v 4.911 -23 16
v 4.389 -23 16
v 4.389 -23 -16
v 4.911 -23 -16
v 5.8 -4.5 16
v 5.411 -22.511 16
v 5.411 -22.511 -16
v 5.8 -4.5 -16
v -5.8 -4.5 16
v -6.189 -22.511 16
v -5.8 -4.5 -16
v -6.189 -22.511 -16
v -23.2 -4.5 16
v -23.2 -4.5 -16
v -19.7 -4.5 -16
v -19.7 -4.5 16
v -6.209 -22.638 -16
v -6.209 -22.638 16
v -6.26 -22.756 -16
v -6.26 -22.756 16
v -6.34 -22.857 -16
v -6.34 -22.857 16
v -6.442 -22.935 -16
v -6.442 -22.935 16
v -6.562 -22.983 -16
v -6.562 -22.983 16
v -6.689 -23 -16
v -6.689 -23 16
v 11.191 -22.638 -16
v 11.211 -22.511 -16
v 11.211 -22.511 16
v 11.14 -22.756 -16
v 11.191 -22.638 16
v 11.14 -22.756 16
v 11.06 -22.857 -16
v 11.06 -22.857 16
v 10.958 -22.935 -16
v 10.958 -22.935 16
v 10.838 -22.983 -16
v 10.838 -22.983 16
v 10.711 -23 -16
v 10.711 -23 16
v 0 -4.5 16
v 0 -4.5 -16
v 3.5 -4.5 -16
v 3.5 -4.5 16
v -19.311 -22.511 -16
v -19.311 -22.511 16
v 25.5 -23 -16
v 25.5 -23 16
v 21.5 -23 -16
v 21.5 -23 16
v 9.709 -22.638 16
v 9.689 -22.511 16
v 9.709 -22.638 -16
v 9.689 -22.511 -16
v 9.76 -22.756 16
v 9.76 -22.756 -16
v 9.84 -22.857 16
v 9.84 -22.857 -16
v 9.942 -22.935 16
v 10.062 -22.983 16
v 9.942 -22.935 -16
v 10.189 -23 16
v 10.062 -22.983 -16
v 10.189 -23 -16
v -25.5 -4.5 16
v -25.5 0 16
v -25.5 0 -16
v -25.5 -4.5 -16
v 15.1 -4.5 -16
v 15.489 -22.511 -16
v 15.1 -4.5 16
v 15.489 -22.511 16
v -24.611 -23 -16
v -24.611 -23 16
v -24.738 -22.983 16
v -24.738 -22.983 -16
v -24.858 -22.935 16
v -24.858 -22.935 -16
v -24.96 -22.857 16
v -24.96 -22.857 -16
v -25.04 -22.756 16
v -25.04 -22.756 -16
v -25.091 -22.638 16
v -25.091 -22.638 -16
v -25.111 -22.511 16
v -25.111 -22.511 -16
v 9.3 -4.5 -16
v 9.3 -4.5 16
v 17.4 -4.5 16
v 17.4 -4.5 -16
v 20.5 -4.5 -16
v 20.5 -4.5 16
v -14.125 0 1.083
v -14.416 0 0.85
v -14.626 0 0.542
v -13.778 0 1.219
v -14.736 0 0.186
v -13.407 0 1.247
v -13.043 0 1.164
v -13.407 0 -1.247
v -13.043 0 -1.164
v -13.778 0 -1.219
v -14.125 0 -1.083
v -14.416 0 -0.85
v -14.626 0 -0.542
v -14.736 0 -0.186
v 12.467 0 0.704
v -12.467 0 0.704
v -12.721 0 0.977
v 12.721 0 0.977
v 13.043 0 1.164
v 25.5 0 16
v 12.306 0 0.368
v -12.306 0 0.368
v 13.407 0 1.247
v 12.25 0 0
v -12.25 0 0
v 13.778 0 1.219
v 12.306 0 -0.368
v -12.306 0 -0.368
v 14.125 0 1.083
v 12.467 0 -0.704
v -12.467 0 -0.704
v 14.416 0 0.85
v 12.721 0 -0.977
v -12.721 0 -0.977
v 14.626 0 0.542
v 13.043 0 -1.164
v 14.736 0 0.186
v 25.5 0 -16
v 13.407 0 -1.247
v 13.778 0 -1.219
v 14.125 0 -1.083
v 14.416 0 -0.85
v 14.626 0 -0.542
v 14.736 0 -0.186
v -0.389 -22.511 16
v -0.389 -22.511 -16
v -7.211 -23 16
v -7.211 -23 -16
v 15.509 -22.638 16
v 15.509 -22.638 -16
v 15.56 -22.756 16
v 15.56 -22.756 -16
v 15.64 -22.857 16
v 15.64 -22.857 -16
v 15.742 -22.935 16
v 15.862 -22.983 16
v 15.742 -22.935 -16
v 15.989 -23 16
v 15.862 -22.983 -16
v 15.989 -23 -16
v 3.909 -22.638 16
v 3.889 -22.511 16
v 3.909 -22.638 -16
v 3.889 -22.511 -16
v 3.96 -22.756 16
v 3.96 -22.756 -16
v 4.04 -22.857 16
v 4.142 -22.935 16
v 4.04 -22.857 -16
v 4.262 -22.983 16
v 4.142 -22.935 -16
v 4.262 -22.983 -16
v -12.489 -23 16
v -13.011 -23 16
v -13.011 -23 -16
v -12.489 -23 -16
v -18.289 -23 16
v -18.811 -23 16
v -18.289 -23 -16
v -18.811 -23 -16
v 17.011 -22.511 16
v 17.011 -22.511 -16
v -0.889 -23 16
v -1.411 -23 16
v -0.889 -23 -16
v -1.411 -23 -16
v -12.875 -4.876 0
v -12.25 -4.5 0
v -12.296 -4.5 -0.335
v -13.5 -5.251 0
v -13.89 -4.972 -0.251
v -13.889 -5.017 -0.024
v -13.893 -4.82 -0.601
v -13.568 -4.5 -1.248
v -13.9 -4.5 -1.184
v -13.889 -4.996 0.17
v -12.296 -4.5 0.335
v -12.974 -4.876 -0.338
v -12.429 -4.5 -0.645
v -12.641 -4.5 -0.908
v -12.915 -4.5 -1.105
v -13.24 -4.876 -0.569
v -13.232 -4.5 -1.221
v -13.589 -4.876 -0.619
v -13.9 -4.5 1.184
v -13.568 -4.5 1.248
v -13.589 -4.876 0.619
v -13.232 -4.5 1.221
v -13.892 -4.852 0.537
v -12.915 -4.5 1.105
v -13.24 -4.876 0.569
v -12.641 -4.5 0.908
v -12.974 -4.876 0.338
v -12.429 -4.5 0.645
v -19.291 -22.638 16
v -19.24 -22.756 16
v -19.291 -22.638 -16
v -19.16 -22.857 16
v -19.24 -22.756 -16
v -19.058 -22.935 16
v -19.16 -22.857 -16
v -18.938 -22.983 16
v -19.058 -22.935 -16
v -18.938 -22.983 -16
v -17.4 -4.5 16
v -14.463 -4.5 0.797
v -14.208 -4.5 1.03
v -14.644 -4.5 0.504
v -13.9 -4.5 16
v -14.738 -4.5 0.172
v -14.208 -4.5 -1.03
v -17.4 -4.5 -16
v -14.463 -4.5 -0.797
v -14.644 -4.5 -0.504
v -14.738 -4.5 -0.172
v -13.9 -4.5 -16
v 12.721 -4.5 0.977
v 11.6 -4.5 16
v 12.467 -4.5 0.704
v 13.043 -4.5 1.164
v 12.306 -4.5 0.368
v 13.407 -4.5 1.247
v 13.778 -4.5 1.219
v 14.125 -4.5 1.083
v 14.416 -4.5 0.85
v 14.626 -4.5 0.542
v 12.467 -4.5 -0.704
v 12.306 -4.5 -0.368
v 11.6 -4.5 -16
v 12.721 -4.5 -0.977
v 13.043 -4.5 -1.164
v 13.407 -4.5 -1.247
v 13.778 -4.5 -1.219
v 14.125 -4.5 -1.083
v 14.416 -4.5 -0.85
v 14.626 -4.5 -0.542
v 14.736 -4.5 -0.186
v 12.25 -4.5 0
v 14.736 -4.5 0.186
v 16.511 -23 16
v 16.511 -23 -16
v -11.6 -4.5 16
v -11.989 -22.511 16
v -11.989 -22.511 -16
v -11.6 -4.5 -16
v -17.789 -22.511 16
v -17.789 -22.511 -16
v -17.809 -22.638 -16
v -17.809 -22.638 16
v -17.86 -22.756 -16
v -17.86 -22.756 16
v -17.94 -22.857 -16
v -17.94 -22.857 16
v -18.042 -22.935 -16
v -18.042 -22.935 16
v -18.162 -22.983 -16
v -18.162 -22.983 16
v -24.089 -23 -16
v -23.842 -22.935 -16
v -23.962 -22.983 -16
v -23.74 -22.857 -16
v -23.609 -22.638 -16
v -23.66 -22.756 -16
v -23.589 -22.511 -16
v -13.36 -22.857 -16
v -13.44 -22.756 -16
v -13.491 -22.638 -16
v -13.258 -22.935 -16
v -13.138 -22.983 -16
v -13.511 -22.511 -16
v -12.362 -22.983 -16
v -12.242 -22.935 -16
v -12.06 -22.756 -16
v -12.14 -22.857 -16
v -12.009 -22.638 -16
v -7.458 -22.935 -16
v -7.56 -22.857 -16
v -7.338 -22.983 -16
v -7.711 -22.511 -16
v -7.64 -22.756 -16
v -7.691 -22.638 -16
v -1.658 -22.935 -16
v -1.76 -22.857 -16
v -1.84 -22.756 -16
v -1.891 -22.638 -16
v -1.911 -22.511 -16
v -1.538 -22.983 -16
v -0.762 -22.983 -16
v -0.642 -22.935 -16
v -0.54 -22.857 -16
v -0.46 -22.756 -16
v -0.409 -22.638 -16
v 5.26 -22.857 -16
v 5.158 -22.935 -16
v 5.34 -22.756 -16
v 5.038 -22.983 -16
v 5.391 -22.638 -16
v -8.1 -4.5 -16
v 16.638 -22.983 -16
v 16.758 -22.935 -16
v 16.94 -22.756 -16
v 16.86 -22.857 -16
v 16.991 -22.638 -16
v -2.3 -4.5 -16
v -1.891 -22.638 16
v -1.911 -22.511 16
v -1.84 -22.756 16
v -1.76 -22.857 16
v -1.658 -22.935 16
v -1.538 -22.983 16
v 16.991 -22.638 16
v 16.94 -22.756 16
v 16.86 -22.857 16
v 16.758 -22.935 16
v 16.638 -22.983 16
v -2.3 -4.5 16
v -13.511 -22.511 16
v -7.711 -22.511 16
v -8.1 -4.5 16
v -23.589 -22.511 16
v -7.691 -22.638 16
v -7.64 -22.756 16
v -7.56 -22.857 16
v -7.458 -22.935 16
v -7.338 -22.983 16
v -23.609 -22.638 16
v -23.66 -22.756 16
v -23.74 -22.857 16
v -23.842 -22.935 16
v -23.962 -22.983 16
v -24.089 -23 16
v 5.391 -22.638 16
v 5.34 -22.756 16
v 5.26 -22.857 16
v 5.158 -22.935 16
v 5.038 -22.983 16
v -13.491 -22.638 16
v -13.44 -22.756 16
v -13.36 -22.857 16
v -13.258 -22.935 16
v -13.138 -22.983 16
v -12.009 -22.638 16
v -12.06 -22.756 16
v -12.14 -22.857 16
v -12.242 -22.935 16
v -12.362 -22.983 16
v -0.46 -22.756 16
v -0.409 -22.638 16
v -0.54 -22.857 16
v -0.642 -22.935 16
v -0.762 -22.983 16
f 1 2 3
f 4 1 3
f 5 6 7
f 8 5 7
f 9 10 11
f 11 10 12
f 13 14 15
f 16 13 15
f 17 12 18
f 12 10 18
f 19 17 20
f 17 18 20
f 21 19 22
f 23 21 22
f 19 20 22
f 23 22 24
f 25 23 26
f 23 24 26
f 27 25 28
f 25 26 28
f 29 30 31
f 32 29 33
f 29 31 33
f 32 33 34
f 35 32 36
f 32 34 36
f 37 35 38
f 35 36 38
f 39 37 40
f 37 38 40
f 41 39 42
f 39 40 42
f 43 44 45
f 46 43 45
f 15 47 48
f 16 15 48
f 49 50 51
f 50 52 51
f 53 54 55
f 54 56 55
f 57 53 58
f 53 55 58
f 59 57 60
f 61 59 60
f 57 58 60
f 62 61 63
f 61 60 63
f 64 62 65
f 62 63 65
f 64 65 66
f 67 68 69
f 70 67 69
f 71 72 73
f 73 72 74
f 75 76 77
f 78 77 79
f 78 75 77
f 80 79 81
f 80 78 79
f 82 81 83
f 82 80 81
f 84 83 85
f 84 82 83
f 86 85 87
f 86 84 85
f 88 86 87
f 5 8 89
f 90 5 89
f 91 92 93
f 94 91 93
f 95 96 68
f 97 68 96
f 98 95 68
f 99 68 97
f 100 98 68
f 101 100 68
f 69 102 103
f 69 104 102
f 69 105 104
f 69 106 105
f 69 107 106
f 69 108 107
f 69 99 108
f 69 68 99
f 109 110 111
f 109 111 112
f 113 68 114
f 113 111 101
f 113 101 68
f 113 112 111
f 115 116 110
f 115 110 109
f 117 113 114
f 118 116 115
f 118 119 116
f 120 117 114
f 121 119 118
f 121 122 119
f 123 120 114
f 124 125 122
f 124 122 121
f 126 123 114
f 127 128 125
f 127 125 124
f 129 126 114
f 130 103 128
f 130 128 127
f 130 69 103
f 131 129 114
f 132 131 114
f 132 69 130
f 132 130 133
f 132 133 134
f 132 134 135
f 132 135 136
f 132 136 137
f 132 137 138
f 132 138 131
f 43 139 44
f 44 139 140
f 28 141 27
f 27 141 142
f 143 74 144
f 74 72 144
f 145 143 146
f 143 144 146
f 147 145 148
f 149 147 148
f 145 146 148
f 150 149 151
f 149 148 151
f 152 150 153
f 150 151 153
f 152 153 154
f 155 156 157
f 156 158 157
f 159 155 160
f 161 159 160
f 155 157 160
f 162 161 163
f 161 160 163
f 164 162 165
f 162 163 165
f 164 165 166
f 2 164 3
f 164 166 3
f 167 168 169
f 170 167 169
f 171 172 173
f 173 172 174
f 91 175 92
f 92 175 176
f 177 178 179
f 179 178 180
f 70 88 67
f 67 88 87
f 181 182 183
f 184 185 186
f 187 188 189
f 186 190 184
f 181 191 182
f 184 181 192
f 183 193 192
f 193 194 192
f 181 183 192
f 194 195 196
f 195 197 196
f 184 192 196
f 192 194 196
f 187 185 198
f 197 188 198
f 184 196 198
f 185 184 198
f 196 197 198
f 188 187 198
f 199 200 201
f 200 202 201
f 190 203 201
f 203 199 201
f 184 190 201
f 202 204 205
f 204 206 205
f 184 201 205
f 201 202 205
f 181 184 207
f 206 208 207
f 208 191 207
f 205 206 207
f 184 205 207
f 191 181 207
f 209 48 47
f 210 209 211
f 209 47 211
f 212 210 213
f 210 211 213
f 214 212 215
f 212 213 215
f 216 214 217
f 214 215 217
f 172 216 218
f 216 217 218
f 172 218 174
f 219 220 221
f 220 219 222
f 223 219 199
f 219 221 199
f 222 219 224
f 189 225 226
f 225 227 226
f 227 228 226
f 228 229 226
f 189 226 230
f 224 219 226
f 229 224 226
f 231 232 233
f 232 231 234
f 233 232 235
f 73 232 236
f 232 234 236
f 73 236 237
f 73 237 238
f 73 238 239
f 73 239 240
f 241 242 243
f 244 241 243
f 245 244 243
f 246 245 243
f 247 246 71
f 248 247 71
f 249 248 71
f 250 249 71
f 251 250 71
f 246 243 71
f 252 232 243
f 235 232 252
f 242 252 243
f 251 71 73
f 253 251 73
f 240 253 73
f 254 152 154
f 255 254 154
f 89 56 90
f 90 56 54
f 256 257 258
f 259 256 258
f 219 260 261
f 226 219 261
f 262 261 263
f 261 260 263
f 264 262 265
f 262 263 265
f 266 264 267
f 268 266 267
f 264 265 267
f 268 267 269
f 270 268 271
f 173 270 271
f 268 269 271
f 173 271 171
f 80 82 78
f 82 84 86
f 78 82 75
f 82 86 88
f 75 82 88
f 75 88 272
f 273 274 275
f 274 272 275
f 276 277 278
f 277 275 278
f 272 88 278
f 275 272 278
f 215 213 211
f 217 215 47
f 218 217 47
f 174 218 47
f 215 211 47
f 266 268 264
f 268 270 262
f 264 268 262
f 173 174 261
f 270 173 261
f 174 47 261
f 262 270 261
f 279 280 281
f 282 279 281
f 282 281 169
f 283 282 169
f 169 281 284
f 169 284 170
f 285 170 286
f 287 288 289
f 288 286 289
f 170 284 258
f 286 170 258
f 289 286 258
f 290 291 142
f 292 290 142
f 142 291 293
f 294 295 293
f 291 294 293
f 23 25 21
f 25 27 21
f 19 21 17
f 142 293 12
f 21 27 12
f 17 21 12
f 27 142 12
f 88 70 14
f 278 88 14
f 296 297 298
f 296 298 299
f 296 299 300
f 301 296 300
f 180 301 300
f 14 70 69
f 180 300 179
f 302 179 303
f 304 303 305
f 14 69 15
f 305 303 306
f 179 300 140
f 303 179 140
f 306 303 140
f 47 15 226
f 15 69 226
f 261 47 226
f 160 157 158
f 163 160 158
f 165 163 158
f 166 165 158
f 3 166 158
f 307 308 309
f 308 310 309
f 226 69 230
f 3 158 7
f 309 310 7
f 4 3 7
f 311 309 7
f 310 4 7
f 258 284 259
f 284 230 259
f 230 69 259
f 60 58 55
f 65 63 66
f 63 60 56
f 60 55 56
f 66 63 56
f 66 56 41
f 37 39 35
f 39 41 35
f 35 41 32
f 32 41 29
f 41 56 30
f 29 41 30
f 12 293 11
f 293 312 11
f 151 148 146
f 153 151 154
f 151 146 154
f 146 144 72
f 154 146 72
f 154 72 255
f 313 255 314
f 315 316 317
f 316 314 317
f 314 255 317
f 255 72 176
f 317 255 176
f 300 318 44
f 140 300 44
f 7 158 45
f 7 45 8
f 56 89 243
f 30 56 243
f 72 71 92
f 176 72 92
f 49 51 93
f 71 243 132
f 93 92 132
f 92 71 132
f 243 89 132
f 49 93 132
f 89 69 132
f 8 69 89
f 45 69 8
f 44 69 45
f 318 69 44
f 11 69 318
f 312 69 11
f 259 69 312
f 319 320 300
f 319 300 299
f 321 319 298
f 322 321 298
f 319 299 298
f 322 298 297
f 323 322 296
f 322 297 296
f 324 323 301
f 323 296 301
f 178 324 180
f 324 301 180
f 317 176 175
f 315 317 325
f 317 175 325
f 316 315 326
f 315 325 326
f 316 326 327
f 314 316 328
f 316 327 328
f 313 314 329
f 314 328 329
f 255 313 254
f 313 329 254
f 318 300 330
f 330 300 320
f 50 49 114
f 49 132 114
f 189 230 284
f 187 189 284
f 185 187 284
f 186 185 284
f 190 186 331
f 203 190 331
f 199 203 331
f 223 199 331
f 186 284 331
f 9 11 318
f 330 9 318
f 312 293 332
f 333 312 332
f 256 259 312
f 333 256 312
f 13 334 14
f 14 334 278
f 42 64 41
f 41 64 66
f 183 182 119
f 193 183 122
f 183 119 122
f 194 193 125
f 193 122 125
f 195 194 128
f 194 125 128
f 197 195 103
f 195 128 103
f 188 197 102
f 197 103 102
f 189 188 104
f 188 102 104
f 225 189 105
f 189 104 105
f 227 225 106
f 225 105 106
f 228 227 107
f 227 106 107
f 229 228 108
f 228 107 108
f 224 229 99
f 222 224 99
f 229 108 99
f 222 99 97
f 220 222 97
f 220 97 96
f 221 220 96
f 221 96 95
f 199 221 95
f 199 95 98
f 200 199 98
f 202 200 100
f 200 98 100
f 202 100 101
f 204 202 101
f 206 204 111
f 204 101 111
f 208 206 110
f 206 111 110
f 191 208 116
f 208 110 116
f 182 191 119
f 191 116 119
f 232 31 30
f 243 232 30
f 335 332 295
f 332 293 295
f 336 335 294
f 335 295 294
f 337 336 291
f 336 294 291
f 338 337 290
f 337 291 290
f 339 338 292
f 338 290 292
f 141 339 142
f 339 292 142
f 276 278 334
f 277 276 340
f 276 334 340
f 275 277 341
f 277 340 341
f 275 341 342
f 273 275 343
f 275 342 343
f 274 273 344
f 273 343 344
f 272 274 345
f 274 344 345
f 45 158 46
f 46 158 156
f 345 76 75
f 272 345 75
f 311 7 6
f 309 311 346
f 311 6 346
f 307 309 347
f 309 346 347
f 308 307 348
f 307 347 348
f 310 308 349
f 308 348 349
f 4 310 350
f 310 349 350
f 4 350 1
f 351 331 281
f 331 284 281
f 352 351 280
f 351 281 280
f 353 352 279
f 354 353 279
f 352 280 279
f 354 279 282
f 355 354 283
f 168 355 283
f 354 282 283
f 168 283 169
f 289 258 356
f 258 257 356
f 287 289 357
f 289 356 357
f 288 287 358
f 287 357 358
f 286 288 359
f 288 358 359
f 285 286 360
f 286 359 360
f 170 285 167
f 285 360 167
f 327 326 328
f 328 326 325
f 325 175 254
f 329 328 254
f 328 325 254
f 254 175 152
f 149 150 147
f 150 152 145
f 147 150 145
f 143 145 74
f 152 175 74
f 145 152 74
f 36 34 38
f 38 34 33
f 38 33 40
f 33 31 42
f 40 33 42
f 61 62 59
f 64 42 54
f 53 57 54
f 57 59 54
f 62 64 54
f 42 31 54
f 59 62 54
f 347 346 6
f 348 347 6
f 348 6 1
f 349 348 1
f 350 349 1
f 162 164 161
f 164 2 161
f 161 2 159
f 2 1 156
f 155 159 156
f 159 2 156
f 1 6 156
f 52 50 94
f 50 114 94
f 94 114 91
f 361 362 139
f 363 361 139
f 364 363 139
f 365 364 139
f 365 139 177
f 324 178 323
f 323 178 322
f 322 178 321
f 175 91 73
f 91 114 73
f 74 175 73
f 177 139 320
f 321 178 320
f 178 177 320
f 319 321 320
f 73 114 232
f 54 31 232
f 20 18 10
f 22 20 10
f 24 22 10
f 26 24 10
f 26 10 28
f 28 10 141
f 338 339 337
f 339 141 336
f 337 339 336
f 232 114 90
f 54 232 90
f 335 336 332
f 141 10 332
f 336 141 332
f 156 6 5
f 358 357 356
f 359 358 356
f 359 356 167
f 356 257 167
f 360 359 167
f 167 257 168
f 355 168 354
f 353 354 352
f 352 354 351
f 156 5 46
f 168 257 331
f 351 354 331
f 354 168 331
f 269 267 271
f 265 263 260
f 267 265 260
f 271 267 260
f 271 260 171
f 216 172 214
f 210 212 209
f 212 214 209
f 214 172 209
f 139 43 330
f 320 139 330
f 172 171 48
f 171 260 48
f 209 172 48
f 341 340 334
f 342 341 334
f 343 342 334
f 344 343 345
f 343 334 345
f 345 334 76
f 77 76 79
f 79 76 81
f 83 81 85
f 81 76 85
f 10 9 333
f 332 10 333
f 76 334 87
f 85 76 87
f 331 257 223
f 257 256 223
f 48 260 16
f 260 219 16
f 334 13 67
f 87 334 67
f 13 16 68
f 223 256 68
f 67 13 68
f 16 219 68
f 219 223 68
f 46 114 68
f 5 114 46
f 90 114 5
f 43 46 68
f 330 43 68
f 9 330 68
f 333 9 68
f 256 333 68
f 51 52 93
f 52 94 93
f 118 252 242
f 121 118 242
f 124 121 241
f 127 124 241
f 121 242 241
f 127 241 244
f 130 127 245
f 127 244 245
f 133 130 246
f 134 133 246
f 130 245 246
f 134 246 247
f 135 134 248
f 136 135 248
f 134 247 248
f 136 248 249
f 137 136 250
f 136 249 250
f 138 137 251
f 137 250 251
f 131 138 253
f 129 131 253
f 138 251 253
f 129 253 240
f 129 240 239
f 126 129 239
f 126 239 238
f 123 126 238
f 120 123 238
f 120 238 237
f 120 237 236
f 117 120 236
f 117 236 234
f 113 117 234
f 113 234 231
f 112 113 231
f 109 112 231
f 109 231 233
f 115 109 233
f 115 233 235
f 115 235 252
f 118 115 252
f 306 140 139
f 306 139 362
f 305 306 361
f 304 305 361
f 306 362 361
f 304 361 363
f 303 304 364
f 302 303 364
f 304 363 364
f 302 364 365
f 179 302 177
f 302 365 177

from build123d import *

# Parameters (mm, degrees)
SKETCH1_W              = 51
SKETCH1_H              = 32
BOSS_EXTRUDE1_DEPTH    = 4.5
FILLET1_R              = 0.5
LPATTERN1_COUNT        = 8
LPATTERN1_PITCH        = 5.8
FILLET1_OF_LPATTERN1_R = 0.5
M3X0_5_TAPPED_HOLE1_D  = 2.5


# Read off the part's stored shape, not the designer's step: Mirror1
with BuildPart() as part:
    # Sketch1 → Boss-Extrude1 (new body)
    with BuildSketch(Plane(origin=(0, 0, 0), x_dir=(1, 0, 0), z_dir=(0, 1, 0))):
        Rectangle(SKETCH1_W, SKETCH1_H)
    extrude(amount=-BOSS_EXTRUDE1_DEPTH)

    # Sketch2 → Loft1 section 0
    with BuildSketch(Plane(origin=(0, -4.5, 0), x_dir=(-1, 0, 0), z_dir=(0, -1, 0))):
        with BuildLine():
            Line((25.5, -16), (23.2, -16))
            Line((23.2, -16), (23.2, 16))
            Line((23.2, 16), (25.5, 16))
            Line((25.5, 16), (25.5, -16))
        make_face()
    # Sketch3 → Loft1 section 1
    with BuildSketch(Plane(origin=(0, -23, 0), x_dir=(1, 0, 0), z_dir=(0, 1, 0))):
        with BuildLine():
            Line((-23.6, -16), (-25.1, -16))
            Line((-25.1, -16), (-25.1, 16))
            Line((-25.1, 16), (-23.6, 16))
            Line((-23.6, 16), (-23.6, -16))
        make_face()
    loft1 = loft()

    # Fillet1
    fillet1_edges = [part.edges().sort_by_distance(p)[0] for p in [
        (-25.1, -23, 0),
        (-23.6, -23, 0),
    ]]
    fillet(fillet1_edges, radius=FILLET1_R)

    # LPattern1: Loft1 ×8
    with Locations(*[(i * LPATTERN1_PITCH, 0, 0) for i in range(1, LPATTERN1_COUNT)]):
        add(loft1)

    # Fillet1 of LPattern1
    fillet1_of_lpattern1_edges = [part.edges().sort_by_distance(p)[0] for p in [
        (-19.3, -23, 0),
        (-17.8, -23, 0),
        (-13.5, -23, 0),
        (-12, -23, 0),
        (-7.7, -23, 0),
        (-6.2, -23, 0),
        (-1.9, -23, 0),
        (-0.4, -23, 0),
        (3.9, -23, 0),
        (5.4, -23, 0),
        (9.7, -23, 0),
        (11.2, -23, 0),
        (15.5, -23, 0),
        (17, -23, 0),
    ]]
    fillet(fillet1_of_lpattern1_edges, radius=FILLET1_OF_LPATTERN1_R)

    # Sketch5 → Loft2 section 0
    with BuildSketch(Plane(origin=(0, -23, 0), x_dir=(1, 0, 0), z_dir=(0, 1, 0))):
        with BuildLine():
            Line((25.5, -16), (21.5, -16))
            Line((21.5, -16), (21.5, 16))
            Line((21.5, 16), (25.5, 16))
            Line((25.5, 16), (25.5, -16))
        make_face()
    # Sketch4 → Loft2 section 1
    with BuildSketch(Plane(origin=(0, -4.5, 0), x_dir=(-1, 0, 0), z_dir=(0, -1, 0))):
        with BuildLine():
            Line((-25.5, -16), (-20.5, -16))
            Line((-20.5, -16), (-20.5, 16))
            Line((-20.5, 16), (-25.5, 16))
            Line((-25.5, 16), (-25.5, -16))
        make_face()
    loft()

    # M3x0.5 Tapped Hole1 (through all)
    with Locations(Plane(origin=(0, 0, 0), x_dir=(1, 0, 0), z_dir=(0, 1, 0))):
        with Locations((13.5, 0)):
            Hole(M3X0_5_TAPPED_HOLE1_D / 2)

    # Mirror1 outline → Mirror1 (revolve, cut)
    with BuildSketch(Plane(origin=(-13.5, 0, 0), x_dir=(1, 0, 0), z_dir=(0, 0, 1))):
        Polygon((0, 0), (0, -5.251075774), (1.250000005, -4.499999997), (1.25, 0), align=None)
    revolve(axis=Axis((-13.5, 0, 0), (0, 1, 0)), mode=Mode.SUBTRACT)


solid = part.part
